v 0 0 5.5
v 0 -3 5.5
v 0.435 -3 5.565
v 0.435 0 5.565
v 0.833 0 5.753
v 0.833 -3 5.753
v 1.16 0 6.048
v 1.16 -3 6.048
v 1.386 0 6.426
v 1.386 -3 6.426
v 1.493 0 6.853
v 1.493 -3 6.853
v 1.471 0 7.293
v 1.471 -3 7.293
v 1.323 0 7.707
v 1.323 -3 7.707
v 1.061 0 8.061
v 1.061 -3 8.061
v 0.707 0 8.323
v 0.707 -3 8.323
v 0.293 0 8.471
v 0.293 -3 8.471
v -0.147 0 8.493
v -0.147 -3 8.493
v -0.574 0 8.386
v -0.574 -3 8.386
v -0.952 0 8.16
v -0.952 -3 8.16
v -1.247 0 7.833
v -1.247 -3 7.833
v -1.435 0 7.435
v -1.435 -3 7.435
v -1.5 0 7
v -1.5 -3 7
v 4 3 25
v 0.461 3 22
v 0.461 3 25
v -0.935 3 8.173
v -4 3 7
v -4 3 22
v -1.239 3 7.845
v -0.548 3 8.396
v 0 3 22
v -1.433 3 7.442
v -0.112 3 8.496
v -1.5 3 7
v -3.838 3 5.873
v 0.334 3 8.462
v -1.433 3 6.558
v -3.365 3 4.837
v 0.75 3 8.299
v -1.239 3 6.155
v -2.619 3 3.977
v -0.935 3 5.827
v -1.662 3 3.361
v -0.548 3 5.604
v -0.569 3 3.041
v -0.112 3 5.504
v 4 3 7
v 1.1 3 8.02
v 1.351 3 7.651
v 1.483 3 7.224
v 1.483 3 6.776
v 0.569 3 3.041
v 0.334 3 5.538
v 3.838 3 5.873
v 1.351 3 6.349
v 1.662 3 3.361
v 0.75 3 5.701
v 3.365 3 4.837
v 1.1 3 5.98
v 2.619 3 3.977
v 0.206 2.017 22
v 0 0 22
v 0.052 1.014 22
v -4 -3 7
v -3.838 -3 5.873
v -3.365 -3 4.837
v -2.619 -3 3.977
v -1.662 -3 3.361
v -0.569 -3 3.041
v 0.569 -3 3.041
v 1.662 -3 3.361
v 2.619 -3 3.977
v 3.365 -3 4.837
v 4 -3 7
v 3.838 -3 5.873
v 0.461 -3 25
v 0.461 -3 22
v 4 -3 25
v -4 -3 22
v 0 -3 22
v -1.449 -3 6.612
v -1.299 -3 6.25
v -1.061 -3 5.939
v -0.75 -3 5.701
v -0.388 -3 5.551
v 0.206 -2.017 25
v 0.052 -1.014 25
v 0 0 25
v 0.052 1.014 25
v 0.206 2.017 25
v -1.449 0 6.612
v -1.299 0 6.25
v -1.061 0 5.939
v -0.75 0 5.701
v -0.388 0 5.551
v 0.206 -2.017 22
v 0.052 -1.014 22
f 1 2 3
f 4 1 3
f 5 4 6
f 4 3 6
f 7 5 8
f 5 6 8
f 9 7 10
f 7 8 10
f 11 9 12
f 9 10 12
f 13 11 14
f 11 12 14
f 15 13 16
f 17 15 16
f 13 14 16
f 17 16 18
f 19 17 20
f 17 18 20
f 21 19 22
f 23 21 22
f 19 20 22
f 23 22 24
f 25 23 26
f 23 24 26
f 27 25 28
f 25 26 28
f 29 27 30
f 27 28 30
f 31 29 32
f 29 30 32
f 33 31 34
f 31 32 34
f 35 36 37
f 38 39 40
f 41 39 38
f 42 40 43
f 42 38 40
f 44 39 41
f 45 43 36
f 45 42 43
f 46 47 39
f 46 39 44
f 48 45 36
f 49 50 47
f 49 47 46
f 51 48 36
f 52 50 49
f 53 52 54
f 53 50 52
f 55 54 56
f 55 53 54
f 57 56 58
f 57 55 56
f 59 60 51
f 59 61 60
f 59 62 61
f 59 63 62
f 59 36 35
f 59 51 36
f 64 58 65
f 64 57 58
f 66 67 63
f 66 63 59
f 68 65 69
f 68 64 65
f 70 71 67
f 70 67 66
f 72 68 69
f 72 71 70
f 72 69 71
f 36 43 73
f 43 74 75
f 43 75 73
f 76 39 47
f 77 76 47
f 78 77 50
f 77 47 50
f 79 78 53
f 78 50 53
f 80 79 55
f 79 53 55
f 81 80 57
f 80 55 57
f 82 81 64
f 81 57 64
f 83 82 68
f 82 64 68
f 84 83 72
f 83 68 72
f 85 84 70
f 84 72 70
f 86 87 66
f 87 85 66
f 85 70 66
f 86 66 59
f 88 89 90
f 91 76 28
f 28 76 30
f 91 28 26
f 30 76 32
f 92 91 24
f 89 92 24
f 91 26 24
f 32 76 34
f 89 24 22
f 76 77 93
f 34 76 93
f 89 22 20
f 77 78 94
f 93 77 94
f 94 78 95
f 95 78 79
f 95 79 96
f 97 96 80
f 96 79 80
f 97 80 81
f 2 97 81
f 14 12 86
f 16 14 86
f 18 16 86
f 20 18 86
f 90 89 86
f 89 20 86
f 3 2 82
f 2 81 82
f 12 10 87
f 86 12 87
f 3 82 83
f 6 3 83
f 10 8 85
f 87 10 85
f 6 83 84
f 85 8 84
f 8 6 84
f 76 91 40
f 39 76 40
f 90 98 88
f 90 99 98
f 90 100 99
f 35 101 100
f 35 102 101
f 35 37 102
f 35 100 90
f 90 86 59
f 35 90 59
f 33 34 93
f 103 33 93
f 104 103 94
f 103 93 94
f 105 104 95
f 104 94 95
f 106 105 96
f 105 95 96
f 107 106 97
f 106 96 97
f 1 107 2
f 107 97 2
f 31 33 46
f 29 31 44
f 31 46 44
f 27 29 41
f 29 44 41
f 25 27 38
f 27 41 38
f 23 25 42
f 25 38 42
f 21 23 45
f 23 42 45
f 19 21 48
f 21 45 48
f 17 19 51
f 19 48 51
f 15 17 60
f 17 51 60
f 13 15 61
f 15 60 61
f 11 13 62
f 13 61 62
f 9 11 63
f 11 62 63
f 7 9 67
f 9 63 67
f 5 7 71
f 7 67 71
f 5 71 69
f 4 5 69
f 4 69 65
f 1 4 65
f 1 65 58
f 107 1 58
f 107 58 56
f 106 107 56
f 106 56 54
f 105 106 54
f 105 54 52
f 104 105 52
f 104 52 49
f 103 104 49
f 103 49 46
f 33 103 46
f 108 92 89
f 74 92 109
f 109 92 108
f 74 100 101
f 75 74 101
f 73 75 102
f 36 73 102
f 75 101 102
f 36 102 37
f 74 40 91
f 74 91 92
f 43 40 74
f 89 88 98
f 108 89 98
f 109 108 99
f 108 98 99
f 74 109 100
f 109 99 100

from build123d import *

# Parameters (mm, degrees)
CROQUIS1_W              = 8
CROQUIS1_H              = 6
SALIENTE_EXTRUIR1_DEPTH = 25
CROQUIS2_W              = 4
CROQUIS2_H              = 3
CORTAR_EXTRUIR1_DEPTH   = 27.019223663
CROQUIS3_R              = 1.5
CORTAR_EXTRUIR2_DEPTH   = 3
CROQUIS4_R              = 4
CROQUIS4_R_2            = 1.5
SALIENTE_EXTRUIR2_DEPTH = 3
CORTAR_EXTRUIR3_DEPTH   = 27.019223663
CORTAR_EXTRUIR4_DEPTH   = 3


with BuildPart() as part:
    # Croquis1 → Saliente-Extruir1 (new body)
    with BuildSketch(Plane.XY):
        Rectangle(CROQUIS1_W, CROQUIS1_H)
    extrude(amount=SALIENTE_EXTRUIR1_DEPTH)

    # Croquis2 → Cortar-Extruir1 (cut, through all)
    with BuildSketch(Plane(origin=(0, 3, 0), x_dir=(1, 0, 0), z_dir=(0, 1, 0))):
        with Locations((-2, -23.5)):
            Rectangle(CROQUIS2_W, CROQUIS2_H)
    extrude(amount=-CORTAR_EXTRUIR1_DEPTH, mode=Mode.SUBTRACT)

    # Croquis3 → Cortar-Extruir2 (cut)
    with BuildSketch(Plane.XZ.offset(3)):
        with Locations(Location((0, 7, 0), (0, 0, 270))):
            Circle(CROQUIS3_R)
    extrude(amount=-CORTAR_EXTRUIR2_DEPTH, mode=Mode.SUBTRACT)

    # Croquis4 → Saliente-Extruir2 (add)
    with BuildSketch(Plane.XZ.offset(3)):
        with Locations((0, 7)):
            Circle(CROQUIS4_R)
        with Locations(Location((0, 7, 0), (0, 0, 270))):
            Circle(CROQUIS4_R_2, mode=Mode.SUBTRACT)
    extrude(amount=-SALIENTE_EXTRUIR2_DEPTH)

    # Croquis5 → Cortar-Extruir3 (cut, through all)
    with BuildSketch(Plane(origin=(0, 3, 0), x_dir=(1, 0, 0), z_dir=(0, 1, 0))):
        with BuildLine():
            Line((4, 0), (-4, 0))
            Line((-4, 0), (-4, -7))
            ThreePointArc((-4, -7), (0, -3), (4, -7))
            Line((4, -7), (4, 0))
        make_face()
        with BuildLine():
            ThreePointArc((1.5, -7), (0, -5.5), (-1.5, -7))
            Line((-1.5, -7), (1.5, -7))
        make_face()
        with BuildLine():
            Line((1.5, -7), (-1.5, -7))
            ThreePointArc((-1.5, -7), (0, -8.5), (1.5, -7))
        make_face()
    extrude(amount=-CORTAR_EXTRUIR3_DEPTH, mode=Mode.SUBTRACT)

    # Croquis6 → Cortar-Extruir4 (cut)
    with BuildSketch(Plane.XY.offset(25)):
        with BuildLine():
            Line((0, 3), (0, 0))
            ThreePointArc((0, 0), (0.115822742, 1.517576993), (0.460607986, 3))
            Line((0.460607986, 3), (0, 3))
        make_face()
        with BuildLine():
            Line((0, 0), (0, -3))
            Line((0, -3), (0.460607986, -3))
            ThreePointArc((0.460607986, -3), (0.115822742, -1.517576993), (0, 0))
        make_face()
    extrude(amount=-CORTAR_EXTRUIR4_DEPTH, mode=Mode.SUBTRACT)


solid = part.part
